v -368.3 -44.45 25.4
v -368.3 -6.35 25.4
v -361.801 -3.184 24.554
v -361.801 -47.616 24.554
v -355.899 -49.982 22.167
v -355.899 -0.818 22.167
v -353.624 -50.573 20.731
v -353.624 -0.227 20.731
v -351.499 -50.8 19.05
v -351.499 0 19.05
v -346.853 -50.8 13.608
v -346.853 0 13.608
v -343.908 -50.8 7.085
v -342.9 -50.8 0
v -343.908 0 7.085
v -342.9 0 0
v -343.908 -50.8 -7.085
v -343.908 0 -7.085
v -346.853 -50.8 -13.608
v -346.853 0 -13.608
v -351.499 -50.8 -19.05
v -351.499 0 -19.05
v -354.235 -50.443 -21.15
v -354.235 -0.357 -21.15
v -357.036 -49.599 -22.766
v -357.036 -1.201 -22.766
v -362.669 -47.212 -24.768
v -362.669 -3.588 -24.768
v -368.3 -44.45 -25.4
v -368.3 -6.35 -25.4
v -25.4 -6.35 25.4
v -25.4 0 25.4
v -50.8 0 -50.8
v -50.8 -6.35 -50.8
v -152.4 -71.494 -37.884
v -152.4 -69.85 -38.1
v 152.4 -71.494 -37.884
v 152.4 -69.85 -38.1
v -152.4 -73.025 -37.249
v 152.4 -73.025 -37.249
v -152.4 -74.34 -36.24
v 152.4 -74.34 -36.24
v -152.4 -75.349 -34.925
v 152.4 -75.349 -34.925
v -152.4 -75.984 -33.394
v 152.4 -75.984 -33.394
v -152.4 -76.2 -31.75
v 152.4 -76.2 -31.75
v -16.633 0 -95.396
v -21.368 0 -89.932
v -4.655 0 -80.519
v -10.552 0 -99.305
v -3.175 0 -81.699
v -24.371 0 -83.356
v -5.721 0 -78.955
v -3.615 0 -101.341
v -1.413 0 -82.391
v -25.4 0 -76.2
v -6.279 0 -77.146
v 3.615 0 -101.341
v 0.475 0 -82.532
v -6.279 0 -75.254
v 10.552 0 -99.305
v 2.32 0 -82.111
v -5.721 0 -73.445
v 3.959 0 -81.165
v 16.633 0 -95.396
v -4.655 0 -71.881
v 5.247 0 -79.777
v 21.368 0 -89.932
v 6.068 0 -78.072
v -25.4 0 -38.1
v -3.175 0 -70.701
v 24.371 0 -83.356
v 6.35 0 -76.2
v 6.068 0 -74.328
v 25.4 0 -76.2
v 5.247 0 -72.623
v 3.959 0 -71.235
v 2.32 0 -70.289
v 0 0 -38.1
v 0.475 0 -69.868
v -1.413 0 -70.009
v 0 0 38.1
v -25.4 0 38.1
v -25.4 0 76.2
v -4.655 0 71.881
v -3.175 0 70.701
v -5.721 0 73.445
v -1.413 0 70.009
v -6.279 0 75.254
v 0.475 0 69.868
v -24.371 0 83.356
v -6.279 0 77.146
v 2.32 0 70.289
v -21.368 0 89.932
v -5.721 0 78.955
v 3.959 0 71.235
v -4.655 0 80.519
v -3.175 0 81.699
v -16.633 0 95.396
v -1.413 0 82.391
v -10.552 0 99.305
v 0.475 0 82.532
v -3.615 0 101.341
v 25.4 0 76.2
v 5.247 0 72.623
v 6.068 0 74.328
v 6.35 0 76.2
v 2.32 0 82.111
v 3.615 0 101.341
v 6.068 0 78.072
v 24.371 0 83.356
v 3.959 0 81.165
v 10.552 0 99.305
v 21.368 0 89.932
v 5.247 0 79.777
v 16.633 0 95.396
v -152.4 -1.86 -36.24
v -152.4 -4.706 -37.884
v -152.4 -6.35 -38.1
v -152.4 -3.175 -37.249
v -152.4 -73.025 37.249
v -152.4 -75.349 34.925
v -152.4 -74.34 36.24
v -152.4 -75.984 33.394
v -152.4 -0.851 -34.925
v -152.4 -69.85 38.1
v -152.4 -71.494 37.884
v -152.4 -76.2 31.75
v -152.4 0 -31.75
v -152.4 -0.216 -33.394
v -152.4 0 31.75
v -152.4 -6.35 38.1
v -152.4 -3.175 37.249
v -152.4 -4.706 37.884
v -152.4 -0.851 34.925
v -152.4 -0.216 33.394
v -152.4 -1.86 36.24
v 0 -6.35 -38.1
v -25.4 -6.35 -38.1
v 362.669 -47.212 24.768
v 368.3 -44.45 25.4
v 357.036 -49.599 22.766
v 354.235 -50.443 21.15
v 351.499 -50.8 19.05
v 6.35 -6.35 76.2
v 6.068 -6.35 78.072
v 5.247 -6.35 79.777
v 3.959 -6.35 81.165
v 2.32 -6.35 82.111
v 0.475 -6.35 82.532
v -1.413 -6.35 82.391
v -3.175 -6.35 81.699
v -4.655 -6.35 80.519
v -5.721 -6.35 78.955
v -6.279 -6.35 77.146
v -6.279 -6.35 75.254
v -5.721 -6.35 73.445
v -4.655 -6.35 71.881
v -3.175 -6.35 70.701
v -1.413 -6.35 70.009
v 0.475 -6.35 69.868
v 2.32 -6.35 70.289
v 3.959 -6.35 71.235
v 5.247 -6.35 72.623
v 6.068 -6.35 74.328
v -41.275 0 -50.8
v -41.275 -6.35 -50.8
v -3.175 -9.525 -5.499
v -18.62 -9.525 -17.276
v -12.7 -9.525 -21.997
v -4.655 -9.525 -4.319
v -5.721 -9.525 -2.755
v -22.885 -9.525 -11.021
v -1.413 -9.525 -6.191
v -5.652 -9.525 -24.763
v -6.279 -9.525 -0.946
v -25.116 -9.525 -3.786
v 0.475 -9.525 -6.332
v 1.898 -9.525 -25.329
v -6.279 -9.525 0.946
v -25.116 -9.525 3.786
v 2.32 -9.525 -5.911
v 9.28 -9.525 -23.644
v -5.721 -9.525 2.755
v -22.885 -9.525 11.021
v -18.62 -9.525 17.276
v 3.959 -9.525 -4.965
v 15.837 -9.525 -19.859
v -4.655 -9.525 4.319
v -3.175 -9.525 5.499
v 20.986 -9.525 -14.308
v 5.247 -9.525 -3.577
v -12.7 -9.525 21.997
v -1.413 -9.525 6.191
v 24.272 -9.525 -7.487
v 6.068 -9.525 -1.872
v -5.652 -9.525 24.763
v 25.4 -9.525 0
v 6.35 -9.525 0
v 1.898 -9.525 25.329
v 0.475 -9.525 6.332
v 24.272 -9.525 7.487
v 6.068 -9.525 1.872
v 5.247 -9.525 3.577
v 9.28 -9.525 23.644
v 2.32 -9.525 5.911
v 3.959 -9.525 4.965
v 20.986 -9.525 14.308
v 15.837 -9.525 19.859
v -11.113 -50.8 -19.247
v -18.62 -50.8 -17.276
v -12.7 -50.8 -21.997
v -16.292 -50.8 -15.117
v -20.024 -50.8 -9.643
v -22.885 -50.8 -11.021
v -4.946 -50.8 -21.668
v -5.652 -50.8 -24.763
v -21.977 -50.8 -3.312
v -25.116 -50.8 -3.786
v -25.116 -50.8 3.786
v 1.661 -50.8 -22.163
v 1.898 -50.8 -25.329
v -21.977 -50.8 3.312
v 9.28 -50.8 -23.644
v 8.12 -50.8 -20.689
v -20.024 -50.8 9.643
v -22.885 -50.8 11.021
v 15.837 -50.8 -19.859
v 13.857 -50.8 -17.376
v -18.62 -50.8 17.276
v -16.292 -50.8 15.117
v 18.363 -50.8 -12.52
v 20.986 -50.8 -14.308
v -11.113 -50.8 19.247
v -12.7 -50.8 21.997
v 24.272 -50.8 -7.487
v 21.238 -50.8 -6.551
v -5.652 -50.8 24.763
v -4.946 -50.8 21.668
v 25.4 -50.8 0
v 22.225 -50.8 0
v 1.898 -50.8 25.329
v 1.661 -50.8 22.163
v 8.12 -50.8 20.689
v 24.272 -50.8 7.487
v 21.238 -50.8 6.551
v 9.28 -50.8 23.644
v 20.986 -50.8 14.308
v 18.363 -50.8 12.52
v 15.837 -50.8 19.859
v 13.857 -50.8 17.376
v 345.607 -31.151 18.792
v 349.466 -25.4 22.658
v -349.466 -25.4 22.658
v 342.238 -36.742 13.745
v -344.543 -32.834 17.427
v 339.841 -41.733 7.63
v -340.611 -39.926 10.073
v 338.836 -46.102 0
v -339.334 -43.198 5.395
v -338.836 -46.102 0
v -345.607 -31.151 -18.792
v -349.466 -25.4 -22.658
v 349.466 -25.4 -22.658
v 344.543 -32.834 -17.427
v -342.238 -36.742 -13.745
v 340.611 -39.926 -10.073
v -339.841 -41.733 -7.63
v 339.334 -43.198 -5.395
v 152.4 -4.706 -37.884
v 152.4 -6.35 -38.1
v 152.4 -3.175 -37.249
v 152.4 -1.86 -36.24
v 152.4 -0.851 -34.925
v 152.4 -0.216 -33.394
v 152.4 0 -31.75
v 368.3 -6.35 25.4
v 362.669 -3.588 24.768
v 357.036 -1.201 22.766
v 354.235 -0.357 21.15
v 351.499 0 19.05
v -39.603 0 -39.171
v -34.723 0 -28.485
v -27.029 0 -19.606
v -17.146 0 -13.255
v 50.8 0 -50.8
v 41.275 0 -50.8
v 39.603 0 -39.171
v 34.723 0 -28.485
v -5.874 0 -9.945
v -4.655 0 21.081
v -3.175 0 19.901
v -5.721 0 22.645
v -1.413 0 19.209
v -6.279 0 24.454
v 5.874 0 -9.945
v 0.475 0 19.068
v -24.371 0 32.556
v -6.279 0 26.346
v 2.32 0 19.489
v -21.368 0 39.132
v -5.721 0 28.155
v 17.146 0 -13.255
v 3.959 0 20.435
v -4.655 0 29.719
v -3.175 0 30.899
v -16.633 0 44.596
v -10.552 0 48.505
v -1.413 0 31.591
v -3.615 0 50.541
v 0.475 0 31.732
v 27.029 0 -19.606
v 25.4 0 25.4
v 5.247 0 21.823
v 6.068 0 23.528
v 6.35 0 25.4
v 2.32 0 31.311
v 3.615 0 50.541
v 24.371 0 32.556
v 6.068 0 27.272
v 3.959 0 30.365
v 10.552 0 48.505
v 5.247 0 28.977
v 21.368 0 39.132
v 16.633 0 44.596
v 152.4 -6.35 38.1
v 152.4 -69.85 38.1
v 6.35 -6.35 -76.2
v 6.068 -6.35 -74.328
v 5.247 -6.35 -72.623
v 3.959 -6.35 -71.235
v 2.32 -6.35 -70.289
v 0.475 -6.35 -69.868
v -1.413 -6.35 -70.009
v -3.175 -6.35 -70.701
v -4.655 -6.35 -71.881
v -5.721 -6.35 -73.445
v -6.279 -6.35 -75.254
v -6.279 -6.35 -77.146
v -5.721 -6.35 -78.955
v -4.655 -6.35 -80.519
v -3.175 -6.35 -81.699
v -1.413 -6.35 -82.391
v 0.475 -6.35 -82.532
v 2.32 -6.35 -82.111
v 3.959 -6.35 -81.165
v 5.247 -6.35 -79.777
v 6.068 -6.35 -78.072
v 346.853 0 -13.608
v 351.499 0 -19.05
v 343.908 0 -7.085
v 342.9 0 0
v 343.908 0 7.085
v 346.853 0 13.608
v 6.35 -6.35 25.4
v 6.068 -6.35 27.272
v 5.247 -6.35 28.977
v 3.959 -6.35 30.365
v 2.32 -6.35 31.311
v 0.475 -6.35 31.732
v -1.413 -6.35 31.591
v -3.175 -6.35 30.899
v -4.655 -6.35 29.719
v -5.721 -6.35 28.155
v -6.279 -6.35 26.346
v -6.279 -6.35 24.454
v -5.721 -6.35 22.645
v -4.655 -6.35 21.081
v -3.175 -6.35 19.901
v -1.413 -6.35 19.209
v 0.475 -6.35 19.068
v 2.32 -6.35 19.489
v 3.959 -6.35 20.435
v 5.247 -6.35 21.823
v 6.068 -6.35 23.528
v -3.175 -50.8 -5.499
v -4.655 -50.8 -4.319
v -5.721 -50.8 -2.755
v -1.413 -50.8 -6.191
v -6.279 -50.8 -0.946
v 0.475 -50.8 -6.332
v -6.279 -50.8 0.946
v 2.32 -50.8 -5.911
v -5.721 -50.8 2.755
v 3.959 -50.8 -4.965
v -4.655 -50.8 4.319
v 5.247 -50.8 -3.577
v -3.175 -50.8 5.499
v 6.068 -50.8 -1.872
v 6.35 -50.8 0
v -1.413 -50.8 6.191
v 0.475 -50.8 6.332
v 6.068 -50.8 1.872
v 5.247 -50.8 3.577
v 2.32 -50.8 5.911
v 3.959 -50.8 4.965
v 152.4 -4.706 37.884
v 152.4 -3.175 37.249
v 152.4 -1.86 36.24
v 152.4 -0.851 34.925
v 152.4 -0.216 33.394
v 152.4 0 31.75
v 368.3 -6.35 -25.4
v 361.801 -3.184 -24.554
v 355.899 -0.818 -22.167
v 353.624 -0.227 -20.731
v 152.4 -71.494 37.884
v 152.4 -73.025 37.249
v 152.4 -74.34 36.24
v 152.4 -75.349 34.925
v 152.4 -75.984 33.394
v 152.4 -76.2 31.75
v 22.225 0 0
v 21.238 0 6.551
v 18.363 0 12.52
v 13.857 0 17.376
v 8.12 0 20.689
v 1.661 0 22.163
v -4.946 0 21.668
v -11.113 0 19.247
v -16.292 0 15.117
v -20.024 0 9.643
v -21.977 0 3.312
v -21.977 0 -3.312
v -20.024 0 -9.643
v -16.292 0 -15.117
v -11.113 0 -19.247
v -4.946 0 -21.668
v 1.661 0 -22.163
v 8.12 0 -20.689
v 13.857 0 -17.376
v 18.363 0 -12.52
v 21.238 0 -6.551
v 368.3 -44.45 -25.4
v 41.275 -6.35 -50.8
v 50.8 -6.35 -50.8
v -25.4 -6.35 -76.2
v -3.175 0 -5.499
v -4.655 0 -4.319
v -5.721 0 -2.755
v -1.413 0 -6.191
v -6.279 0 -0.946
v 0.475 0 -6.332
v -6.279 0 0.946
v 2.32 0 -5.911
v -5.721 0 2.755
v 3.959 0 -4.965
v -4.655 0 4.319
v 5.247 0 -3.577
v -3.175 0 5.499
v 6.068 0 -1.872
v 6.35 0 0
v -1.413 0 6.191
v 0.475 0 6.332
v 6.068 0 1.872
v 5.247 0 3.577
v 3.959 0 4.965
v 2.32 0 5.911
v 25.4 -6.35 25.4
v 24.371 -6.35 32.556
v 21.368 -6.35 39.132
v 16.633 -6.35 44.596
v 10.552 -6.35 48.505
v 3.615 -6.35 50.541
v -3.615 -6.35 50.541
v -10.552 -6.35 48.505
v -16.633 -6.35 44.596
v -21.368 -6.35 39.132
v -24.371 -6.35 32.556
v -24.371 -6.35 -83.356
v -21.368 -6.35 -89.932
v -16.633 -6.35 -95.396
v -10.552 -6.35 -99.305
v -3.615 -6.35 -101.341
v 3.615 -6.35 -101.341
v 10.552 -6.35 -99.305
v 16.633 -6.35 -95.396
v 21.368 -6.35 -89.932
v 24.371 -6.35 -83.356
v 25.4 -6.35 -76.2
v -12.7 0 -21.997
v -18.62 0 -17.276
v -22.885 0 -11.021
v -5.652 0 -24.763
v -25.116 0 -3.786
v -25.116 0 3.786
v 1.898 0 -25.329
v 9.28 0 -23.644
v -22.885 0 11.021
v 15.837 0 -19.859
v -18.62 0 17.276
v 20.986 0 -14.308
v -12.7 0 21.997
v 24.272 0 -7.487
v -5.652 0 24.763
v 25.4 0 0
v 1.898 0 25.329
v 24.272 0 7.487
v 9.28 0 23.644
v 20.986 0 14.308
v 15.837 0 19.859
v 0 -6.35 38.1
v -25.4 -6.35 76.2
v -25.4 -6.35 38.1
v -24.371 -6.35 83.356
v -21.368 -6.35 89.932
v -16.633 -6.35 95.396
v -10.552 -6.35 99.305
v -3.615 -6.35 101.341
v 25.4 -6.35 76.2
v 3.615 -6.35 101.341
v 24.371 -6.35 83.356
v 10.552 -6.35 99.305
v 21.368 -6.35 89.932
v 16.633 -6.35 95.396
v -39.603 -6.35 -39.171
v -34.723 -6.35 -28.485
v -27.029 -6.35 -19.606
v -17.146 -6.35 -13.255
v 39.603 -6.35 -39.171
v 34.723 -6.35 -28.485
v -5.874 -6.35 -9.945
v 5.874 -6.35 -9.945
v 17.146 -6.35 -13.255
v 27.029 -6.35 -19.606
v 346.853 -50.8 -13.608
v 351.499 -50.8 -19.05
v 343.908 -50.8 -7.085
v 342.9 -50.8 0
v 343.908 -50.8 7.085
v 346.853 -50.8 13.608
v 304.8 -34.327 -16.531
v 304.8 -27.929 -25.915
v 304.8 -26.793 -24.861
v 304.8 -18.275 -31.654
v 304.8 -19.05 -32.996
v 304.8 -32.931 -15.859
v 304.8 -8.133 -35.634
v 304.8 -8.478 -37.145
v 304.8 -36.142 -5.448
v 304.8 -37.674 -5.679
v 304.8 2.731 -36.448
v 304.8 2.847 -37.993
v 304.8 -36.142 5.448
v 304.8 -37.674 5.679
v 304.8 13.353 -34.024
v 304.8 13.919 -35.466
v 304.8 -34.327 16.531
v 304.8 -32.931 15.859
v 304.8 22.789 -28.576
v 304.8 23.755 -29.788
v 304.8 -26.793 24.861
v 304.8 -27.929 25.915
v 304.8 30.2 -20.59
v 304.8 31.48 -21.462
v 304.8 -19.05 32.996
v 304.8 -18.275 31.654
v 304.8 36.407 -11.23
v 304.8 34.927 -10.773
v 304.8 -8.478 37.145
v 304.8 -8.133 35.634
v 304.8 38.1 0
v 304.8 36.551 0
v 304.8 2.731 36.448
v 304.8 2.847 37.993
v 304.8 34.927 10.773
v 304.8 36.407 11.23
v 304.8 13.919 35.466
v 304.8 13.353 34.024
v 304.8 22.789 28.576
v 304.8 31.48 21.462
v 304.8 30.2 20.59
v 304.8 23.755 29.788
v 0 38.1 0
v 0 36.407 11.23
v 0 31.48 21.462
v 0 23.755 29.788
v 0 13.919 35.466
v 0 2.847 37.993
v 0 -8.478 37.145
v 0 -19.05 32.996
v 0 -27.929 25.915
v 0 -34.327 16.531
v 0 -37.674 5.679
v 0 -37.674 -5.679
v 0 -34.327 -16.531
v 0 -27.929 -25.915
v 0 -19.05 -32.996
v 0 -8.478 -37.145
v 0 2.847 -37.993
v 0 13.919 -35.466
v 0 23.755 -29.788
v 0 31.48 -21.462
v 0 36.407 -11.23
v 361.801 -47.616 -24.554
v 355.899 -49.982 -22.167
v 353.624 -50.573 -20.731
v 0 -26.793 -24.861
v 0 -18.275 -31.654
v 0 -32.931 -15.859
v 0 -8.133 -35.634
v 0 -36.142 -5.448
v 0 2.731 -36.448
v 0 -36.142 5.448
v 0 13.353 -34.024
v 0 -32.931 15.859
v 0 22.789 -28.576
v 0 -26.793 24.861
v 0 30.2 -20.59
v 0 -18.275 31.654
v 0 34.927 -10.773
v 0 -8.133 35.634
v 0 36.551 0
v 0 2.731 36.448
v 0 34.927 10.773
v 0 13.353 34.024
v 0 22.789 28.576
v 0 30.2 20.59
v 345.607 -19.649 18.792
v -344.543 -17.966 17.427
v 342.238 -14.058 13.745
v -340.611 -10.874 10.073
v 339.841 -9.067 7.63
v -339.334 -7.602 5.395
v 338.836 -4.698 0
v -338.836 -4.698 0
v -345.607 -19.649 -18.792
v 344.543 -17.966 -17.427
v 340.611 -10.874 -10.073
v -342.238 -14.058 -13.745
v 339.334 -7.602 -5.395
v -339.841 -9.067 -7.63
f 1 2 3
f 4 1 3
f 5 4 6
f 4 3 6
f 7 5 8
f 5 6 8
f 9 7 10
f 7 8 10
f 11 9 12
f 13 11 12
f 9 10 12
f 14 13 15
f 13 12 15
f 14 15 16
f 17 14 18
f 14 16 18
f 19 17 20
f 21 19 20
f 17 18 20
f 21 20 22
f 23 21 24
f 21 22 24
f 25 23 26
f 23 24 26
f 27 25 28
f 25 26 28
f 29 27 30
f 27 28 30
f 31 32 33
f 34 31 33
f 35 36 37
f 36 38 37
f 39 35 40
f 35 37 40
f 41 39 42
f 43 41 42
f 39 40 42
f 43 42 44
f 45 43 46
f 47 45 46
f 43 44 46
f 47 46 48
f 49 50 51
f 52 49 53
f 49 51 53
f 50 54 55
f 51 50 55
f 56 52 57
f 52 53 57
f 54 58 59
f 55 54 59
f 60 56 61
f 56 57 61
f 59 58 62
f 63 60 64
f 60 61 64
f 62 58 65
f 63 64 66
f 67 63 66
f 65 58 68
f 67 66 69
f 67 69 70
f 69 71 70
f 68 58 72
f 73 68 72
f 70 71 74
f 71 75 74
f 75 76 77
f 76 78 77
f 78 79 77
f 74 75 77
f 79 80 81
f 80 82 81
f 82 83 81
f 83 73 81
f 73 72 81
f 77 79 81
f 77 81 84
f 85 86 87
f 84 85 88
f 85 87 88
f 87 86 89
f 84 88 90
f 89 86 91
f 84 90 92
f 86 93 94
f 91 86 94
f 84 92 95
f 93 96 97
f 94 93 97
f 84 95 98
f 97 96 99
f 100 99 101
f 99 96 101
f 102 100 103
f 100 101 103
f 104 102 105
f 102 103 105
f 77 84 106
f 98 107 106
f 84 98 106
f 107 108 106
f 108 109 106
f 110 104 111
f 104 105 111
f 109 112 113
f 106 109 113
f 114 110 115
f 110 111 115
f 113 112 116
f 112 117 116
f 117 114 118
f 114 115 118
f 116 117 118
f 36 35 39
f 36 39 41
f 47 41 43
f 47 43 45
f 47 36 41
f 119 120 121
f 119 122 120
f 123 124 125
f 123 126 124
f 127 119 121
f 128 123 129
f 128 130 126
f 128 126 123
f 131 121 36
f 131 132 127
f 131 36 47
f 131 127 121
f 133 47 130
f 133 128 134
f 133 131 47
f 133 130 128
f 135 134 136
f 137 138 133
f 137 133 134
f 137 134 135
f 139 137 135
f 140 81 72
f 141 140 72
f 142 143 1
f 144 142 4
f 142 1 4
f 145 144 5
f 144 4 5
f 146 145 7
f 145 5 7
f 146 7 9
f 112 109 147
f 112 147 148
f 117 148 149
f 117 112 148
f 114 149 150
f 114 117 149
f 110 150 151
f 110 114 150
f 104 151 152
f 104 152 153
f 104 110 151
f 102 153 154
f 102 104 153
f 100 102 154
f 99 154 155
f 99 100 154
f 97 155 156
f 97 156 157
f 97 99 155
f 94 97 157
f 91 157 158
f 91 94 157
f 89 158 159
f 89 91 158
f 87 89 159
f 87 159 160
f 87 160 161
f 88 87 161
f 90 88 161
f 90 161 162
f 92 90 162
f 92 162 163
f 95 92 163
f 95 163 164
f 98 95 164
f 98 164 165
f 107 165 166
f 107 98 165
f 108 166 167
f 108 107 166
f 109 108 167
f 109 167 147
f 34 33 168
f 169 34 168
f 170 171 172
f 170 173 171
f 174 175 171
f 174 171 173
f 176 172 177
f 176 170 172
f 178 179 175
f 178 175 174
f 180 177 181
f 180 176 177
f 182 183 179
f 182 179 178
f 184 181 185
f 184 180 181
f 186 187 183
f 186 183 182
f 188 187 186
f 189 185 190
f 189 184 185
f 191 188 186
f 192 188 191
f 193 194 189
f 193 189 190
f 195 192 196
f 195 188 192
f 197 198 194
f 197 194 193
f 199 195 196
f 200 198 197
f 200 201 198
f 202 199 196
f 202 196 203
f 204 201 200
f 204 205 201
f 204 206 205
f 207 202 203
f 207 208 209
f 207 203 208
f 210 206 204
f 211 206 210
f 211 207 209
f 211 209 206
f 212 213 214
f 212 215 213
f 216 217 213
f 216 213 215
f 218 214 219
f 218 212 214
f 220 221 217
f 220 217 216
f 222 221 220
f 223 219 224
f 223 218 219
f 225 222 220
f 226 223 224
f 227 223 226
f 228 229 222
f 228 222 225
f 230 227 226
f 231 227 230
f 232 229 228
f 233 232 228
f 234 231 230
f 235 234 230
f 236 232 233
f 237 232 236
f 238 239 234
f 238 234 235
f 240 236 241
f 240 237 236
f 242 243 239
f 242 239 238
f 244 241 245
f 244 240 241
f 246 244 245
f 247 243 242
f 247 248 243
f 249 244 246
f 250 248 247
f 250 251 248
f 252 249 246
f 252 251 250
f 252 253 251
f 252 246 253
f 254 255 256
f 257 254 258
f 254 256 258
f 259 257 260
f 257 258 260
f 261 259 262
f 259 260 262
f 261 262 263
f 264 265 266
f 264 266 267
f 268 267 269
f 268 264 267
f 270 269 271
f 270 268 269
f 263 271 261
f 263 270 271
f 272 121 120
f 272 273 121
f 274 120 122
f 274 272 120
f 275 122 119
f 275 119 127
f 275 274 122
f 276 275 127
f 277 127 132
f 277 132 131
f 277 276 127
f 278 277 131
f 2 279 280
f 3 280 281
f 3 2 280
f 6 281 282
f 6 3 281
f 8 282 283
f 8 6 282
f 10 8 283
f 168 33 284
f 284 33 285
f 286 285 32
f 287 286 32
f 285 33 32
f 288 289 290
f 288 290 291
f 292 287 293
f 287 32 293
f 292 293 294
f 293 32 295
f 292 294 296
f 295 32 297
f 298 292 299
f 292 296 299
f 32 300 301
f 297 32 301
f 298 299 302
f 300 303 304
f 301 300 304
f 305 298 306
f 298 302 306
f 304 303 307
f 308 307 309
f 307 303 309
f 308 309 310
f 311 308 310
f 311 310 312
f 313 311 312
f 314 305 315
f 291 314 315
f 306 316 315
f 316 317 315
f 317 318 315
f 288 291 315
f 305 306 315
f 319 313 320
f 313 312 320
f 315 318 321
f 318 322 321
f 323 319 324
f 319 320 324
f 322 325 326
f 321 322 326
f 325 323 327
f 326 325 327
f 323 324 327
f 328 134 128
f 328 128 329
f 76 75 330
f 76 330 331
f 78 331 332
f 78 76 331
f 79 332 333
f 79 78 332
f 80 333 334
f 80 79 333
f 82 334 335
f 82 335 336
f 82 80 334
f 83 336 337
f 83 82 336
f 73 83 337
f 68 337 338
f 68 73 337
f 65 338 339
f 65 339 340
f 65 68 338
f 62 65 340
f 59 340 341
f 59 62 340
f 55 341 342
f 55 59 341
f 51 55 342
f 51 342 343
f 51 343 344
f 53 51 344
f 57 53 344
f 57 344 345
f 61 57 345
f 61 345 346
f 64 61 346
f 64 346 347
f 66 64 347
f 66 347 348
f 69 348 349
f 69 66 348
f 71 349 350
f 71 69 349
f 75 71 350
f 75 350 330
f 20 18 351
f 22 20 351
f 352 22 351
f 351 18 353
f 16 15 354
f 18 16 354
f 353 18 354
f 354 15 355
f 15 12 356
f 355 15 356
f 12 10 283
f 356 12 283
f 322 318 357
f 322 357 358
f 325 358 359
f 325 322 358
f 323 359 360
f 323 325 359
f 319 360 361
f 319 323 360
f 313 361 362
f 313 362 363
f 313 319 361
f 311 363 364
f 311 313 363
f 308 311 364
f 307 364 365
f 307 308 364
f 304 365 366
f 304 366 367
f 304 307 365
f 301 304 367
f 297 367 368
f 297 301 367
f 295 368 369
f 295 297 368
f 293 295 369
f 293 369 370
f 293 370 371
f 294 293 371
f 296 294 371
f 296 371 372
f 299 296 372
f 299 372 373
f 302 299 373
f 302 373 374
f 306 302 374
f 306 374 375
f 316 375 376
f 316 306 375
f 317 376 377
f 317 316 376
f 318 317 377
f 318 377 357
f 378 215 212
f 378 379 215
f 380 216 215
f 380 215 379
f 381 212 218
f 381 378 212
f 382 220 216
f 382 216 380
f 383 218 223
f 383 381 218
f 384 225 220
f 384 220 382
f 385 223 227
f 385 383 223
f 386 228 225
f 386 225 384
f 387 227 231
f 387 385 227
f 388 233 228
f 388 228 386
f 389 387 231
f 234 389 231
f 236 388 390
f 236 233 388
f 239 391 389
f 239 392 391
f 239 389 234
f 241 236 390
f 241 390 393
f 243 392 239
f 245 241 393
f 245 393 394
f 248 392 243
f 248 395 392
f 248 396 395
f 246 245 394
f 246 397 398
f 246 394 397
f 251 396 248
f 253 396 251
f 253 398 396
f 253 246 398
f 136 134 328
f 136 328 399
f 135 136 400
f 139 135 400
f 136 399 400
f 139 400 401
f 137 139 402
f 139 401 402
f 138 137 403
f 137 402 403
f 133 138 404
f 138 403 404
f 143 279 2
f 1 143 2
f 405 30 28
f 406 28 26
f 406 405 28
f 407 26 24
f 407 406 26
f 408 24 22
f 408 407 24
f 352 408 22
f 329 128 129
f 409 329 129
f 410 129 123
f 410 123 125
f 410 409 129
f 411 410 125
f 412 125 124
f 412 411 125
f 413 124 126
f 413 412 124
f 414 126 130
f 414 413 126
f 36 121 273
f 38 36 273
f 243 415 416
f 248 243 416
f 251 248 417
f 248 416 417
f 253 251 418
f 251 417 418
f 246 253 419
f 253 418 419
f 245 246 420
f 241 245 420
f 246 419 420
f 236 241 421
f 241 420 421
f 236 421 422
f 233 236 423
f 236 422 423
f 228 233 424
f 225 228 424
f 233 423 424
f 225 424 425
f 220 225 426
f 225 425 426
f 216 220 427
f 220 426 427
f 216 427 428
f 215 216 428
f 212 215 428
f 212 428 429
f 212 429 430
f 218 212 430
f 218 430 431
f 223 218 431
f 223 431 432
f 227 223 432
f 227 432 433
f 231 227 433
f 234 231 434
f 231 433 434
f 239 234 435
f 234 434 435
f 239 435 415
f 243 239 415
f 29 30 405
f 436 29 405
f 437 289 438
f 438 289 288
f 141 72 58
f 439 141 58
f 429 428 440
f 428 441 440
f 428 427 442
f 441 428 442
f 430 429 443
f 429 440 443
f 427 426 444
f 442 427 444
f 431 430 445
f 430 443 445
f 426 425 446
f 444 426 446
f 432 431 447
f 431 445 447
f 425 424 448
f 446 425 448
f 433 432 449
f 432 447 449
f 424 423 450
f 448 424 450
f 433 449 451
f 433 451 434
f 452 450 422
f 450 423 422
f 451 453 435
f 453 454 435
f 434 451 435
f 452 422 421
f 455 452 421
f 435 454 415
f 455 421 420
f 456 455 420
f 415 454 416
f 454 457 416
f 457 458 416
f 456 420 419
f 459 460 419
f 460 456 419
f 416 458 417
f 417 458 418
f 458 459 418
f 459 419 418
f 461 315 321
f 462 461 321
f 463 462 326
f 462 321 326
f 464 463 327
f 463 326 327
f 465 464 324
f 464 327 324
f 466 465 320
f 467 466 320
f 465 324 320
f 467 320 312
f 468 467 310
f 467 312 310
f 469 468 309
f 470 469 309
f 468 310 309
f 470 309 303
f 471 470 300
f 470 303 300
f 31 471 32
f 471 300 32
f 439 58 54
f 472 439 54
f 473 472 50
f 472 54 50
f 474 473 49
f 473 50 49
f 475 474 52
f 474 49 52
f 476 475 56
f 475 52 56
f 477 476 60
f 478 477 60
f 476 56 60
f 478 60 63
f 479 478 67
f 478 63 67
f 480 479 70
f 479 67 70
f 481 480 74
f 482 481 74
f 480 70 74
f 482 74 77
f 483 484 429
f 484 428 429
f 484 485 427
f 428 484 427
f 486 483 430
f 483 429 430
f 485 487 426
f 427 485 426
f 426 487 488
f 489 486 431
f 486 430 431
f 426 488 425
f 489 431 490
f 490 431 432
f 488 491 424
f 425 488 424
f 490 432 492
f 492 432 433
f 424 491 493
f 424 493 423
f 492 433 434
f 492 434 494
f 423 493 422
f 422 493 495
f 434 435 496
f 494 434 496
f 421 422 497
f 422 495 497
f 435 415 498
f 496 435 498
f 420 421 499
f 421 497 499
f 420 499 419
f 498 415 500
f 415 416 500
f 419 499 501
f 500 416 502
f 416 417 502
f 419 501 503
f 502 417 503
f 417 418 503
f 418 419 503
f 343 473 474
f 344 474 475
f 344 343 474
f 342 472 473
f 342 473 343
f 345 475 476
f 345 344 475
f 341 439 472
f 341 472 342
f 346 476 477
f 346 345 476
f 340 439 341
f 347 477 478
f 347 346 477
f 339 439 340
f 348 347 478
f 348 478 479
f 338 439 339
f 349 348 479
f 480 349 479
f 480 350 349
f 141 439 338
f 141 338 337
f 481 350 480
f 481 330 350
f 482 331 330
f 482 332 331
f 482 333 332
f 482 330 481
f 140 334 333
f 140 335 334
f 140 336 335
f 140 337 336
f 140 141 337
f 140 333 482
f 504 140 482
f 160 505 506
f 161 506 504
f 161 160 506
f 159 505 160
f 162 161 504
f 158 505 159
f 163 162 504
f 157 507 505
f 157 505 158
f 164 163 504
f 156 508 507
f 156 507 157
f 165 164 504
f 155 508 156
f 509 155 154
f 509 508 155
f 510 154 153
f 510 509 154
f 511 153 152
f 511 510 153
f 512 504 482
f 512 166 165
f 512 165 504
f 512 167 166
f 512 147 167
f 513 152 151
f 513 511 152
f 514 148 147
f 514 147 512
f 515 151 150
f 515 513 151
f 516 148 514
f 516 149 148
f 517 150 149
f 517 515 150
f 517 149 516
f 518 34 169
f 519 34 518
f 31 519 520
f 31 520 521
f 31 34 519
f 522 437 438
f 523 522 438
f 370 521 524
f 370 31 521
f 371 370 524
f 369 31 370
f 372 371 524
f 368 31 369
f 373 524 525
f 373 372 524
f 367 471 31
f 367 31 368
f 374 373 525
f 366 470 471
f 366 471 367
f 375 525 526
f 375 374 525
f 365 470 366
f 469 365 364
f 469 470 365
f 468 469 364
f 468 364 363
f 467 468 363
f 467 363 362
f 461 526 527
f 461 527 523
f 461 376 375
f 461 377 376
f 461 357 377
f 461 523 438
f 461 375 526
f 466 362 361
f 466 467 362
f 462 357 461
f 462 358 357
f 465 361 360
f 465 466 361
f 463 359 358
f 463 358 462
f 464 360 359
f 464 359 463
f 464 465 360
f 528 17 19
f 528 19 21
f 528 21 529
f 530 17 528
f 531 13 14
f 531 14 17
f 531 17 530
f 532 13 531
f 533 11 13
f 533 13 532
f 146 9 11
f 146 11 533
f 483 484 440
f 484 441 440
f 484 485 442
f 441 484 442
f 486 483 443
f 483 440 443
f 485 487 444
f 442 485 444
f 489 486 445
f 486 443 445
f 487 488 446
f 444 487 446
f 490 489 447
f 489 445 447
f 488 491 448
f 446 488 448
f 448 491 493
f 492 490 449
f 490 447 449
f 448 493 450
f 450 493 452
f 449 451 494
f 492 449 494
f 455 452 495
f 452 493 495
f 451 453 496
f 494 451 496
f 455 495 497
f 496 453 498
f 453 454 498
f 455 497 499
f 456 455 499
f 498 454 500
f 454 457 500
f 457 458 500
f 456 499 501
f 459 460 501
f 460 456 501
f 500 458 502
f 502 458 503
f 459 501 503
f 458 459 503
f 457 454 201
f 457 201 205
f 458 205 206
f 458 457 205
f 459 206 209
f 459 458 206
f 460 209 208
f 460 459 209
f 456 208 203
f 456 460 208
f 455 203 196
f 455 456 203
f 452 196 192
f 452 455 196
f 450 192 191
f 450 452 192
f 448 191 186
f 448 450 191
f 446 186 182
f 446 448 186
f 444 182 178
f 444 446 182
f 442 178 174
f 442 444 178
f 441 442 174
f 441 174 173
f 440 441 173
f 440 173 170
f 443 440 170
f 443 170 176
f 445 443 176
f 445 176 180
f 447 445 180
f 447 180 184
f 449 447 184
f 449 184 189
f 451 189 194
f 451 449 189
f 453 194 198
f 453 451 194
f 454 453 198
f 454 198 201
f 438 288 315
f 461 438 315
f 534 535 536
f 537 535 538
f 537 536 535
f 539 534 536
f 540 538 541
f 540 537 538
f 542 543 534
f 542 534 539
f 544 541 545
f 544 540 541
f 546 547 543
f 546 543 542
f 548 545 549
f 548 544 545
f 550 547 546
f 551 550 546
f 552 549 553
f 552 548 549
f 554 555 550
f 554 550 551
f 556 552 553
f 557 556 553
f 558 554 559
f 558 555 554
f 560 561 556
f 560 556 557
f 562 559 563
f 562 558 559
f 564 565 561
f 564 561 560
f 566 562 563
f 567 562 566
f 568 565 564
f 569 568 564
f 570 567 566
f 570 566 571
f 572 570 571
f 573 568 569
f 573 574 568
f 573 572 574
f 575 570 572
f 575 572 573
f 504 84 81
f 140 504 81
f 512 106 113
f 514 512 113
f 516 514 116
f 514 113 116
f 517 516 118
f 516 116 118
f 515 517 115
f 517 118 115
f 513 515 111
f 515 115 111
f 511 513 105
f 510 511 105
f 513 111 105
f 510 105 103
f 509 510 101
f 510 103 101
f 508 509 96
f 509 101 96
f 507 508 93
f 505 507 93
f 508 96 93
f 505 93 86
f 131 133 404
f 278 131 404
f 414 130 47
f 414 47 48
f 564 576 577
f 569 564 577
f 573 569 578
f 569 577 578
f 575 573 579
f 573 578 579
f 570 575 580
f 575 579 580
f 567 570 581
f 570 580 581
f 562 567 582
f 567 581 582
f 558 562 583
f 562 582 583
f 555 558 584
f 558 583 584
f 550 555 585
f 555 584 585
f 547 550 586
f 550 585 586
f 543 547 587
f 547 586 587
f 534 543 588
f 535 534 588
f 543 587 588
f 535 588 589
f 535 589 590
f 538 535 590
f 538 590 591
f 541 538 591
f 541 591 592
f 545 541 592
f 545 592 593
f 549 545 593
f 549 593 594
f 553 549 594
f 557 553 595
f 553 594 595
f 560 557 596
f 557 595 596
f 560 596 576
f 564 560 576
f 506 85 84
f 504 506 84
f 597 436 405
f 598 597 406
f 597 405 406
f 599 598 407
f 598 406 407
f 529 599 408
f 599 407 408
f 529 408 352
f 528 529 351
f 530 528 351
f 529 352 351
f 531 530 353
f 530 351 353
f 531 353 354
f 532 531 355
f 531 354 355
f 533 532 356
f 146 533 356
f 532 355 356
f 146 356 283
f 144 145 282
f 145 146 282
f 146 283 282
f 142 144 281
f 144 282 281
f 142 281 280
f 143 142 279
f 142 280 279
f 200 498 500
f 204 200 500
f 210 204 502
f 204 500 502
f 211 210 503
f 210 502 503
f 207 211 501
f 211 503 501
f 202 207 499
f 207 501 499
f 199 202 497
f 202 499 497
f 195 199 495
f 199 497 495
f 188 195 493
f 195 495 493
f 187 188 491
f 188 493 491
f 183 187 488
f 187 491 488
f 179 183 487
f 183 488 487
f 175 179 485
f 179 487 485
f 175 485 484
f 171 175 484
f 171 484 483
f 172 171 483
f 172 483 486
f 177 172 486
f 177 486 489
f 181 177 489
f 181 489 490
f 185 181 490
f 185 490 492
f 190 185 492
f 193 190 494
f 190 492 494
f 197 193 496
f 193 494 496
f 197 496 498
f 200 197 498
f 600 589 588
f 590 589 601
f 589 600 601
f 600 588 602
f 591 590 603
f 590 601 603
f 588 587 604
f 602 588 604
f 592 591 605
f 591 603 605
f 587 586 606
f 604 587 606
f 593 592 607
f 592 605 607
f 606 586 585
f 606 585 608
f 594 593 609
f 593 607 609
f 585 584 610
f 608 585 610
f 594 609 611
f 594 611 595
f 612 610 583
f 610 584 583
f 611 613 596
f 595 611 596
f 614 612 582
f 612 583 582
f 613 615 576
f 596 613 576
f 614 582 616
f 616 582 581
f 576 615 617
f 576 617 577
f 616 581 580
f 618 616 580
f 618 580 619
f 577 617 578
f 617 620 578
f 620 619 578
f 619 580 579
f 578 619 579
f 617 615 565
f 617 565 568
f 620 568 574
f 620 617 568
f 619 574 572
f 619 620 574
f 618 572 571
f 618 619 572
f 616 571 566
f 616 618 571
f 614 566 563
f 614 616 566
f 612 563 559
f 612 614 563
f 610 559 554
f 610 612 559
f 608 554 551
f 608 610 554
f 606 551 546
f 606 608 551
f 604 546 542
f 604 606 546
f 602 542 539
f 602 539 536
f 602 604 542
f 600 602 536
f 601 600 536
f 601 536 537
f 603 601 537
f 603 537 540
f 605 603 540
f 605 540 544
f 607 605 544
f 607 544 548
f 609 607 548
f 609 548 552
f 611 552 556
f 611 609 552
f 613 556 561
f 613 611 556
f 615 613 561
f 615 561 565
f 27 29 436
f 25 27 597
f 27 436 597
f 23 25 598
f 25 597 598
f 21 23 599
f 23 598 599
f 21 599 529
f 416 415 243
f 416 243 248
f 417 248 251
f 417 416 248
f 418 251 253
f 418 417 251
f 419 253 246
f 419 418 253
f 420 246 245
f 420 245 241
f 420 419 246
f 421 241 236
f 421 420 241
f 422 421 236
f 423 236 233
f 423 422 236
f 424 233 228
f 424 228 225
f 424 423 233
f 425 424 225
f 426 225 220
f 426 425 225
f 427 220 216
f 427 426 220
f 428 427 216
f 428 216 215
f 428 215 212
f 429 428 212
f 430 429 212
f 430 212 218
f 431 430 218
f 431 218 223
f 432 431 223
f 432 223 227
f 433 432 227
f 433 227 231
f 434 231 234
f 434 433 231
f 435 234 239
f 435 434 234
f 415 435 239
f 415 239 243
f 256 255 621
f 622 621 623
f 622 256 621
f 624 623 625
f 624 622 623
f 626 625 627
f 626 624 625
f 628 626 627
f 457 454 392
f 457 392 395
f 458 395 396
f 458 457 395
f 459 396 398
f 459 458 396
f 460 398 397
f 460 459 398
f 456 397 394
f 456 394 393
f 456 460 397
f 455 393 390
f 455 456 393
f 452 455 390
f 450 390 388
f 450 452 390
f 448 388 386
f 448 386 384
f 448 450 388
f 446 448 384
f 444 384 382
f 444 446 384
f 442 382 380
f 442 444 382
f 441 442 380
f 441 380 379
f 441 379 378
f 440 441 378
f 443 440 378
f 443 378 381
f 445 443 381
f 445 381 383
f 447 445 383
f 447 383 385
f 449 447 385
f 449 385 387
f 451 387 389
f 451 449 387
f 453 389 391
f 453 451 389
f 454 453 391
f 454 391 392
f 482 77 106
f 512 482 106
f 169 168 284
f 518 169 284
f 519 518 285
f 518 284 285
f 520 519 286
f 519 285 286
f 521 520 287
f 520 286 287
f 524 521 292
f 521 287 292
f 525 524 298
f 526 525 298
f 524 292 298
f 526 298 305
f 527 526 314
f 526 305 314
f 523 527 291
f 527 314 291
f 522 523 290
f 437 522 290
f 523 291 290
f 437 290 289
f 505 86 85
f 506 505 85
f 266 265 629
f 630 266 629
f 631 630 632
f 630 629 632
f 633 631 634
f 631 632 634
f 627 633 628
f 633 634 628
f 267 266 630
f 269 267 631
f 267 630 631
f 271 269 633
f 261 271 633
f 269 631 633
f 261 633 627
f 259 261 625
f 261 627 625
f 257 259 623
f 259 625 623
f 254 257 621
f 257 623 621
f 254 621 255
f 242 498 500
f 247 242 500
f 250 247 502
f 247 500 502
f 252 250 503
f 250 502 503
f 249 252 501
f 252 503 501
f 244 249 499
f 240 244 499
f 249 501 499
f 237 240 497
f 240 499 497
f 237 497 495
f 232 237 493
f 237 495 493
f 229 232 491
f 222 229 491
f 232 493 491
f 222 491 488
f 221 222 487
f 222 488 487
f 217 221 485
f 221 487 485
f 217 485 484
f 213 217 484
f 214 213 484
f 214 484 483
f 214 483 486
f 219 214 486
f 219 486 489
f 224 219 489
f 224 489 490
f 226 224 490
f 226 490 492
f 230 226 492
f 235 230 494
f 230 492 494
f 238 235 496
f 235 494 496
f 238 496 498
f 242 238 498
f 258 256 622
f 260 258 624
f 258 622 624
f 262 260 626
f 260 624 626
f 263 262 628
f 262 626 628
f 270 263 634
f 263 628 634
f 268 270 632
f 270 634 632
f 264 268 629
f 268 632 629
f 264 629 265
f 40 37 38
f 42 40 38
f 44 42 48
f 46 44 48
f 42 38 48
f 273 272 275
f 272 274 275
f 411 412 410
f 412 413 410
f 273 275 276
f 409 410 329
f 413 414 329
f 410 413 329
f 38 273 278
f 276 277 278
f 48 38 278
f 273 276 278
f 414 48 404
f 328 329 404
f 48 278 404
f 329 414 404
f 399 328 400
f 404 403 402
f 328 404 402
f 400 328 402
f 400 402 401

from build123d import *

# Parameters (mm, degrees)
F1_DEPTH    = 50.8
F2_R        = 6.35
F3_R        = 25.4
F3_R_2      = 22.225
F4_DEPTH    = 50.8
F6_DEPTH    = 50.8
F7_T1_DEPTH = 990.6
F8_R        = 6.35
F9_DEPTH    = 6.35
F10_R       = 22.225
F10_R_2     = 6.35
F11_DEPTH   = 50.8
F12_R       = 25.4
F12_R_2     = 6.35
F13_DEPTH   = 9.525
F14_R       = 38.1
F14_R_2     = 36.5506
F15_DEPTH   = 304.8
F16_R       = 6.35
F17_DEPTH   = 6.35
F18_W       = 304.8
F18_H       = 76.2
F19_DEPTH   = 76.2
F20_R       = 6.35


# Not quite as in the source:
# - a fillet or chamfer that OpenCascade refuses, or shapes differently, is made with other operations: its cross-section is extruded or revolved along the edge and cut away or added


with BuildPart() as f1:
    # F0 (on Front) → F1 (new body)
    with BuildSketch(Plane.XZ):
        with BuildLine():
            ThreePointArc((368.3, -25.4), (342.9, 0), (368.3, 25.4))
            Line((368.3, 25.4), (-368.3, 25.4))
            ThreePointArc((-368.3, 25.4), (-342.9, 0), (-368.3, -25.4))
            Line((-368.3, -25.4), (368.3, -25.4))
        make_face()
    extrude(amount=F1_DEPTH)

    # F2
    f2_edges = [f1.edges().sort_by_distance(p)[0] for p in [
        (0, -50.8, -25.4),
        (0, -50.8, 25.4),
        (0, 0, 25.4),
        (0, 0, -25.4),
    ]]
    fillet(f2_edges, radius=F2_R)


with BuildPart() as f4:
    # F3 (on Front) → F4 (new body)
    with BuildSketch(Plane.XZ):
        Circle(F3_R)
        Circle(F3_R_2, mode=Mode.SUBTRACT)
    extrude(amount=F4_DEPTH)


with BuildPart() as f6:
    # F5 (on Front) → F6 (new body)
    with BuildSketch(Plane.XZ):
        with BuildLine():
            ThreePointArc((368.3, -29.464), (338.836, 0), (368.3, 29.464))
            Line((368.3, 29.464), (-368.3, 29.464))
            ThreePointArc((-368.3, 29.464), (-338.836, 0), (-368.3, -29.464))
            Line((-368.3, -29.464), (368.3, -29.464))
        make_face()
    extrude(amount=F6_DEPTH)

    # F7: fillet of radius 50.8 on 4 edges, made by hand

    # F7_s2 → F7_t1 (cut)
    with BuildSketch(Plane.YZ.offset(-495.3)):
        with BuildLine():
            ThreePointArc((0, -29.464), (-35.9210244843, -14.5850244843), (-50.8, 21.336))
            Line((-50.8, 21.336), (-50.8, -29.464))
            Line((-50.8, -29.464), (0, -29.464))
        make_face()
        with BuildLine():
            ThreePointArc((0, 29.464), (-35.9210244843, 14.5850244843), (-50.8, -21.336))
            Line((-50.8, -21.336), (-50.8, 29.464))
            Line((-50.8, 29.464), (0, 29.464))
        make_face()
        with BuildLine():
            ThreePointArc((-50.8, -29.464), (-14.8789755157, -14.5850244843), (0, 21.336))
            Line((0, 21.336), (0, -29.464))
            Line((0, -29.464), (-50.8, -29.464))
        make_face()
        with BuildLine():
            ThreePointArc((-50.8, 29.464), (-14.8789755157, 14.5850244843), (0, -21.336))
            Line((0, -21.336), (0, 29.464))
            Line((0, 29.464), (-50.8, 29.464))
        make_face()
    extrude(amount=F7_T1_DEPTH, mode=Mode.SUBTRACT)


with BuildPart() as f9:
    # F8 (on Front) → F9 (new body)
    with BuildSketch(Plane.XZ):
        with BuildLine():
            Line((41.275, -50.8), (50.8, -50.8))
            Line((50.8, -50.8), (25.4, 25.4))
            ThreePointArc((25.4, 25.4), (0, 50.8), (-25.4, 25.4))
            Line((-25.4, 25.4), (-50.8, -50.8))
            Line((-50.8, -50.8), (-41.275, -50.8))
            ThreePointArc((-41.275, -50.8), (0, -9.525), (41.275, -50.8))
        make_face()
        with Locations((0, 25.4)):
            Circle(F8_R, mode=Mode.SUBTRACT)
    extrude(amount=F9_DEPTH)


with BuildPart() as f11:
    # F10 (on Front) → F11 (new body)
    with BuildSketch(Plane.XZ):
        Circle(F10_R)
        Circle(F10_R_2, mode=Mode.SUBTRACT)
    extrude(amount=F11_DEPTH)


with BuildPart() as f13:
    # F12 (on Front) → F13 (new body)
    with BuildSketch(Plane.XZ):
        Circle(F12_R)
        Circle(F12_R_2, mode=Mode.SUBTRACT)
    extrude(amount=F13_DEPTH)


with BuildPart() as f15:
    # F14 (on Right) → F15 (new body)
    with BuildSketch(Plane.YZ):
        Circle(F14_R)
        Circle(F14_R_2, mode=Mode.SUBTRACT)
    extrude(amount=F15_DEPTH)


with BuildPart() as f17:
    # F16 (on Front) → F17 (new body)
    with BuildSketch(Plane.XZ):
        with BuildLine():
            Line((25.4, -76.2), (25.4, 76.2))
            ThreePointArc((25.4, 76.2), (0, 101.6), (-25.4, 76.2))
            Line((-25.4, 76.2), (-25.4, 38.1))
            Line((-25.4, 38.1), (0, 38.1))
            Line((0, 38.1), (0, -38.1))
            Line((0, -38.1), (-25.4, -38.1))
            Line((-25.4, -38.1), (-25.4, -76.2))
            ThreePointArc((-25.4, -76.2), (0, -101.6), (25.4, -76.2))
        make_face()
        with Locations((0, -76.2)):
            Circle(F16_R, mode=Mode.SUBTRACT)
        with Locations((0, 76.2)):
            Circle(F16_R, mode=Mode.SUBTRACT)
    extrude(amount=F17_DEPTH)


with BuildPart() as f19:
    # F18 (on Front) → F19 (new body)
    with BuildSketch(Plane.XZ):
        Rectangle(F18_W, F18_H)
    extrude(amount=F19_DEPTH)

    # F20
    f20_edges = [f19.edges().sort_by_distance(p)[0] for p in [
        (0, -76.2, 38.1),
        (0, -76.2, -38.1),
        (0, 0, 38.1),
        (0, 0, -38.1),
    ]]
    fillet(f20_edges, radius=F20_R)


solid = Compound([f1.part, f4.part, f6.part, f9.part, f11.part, f13.part, f15.part, f17.part, f19.part])
